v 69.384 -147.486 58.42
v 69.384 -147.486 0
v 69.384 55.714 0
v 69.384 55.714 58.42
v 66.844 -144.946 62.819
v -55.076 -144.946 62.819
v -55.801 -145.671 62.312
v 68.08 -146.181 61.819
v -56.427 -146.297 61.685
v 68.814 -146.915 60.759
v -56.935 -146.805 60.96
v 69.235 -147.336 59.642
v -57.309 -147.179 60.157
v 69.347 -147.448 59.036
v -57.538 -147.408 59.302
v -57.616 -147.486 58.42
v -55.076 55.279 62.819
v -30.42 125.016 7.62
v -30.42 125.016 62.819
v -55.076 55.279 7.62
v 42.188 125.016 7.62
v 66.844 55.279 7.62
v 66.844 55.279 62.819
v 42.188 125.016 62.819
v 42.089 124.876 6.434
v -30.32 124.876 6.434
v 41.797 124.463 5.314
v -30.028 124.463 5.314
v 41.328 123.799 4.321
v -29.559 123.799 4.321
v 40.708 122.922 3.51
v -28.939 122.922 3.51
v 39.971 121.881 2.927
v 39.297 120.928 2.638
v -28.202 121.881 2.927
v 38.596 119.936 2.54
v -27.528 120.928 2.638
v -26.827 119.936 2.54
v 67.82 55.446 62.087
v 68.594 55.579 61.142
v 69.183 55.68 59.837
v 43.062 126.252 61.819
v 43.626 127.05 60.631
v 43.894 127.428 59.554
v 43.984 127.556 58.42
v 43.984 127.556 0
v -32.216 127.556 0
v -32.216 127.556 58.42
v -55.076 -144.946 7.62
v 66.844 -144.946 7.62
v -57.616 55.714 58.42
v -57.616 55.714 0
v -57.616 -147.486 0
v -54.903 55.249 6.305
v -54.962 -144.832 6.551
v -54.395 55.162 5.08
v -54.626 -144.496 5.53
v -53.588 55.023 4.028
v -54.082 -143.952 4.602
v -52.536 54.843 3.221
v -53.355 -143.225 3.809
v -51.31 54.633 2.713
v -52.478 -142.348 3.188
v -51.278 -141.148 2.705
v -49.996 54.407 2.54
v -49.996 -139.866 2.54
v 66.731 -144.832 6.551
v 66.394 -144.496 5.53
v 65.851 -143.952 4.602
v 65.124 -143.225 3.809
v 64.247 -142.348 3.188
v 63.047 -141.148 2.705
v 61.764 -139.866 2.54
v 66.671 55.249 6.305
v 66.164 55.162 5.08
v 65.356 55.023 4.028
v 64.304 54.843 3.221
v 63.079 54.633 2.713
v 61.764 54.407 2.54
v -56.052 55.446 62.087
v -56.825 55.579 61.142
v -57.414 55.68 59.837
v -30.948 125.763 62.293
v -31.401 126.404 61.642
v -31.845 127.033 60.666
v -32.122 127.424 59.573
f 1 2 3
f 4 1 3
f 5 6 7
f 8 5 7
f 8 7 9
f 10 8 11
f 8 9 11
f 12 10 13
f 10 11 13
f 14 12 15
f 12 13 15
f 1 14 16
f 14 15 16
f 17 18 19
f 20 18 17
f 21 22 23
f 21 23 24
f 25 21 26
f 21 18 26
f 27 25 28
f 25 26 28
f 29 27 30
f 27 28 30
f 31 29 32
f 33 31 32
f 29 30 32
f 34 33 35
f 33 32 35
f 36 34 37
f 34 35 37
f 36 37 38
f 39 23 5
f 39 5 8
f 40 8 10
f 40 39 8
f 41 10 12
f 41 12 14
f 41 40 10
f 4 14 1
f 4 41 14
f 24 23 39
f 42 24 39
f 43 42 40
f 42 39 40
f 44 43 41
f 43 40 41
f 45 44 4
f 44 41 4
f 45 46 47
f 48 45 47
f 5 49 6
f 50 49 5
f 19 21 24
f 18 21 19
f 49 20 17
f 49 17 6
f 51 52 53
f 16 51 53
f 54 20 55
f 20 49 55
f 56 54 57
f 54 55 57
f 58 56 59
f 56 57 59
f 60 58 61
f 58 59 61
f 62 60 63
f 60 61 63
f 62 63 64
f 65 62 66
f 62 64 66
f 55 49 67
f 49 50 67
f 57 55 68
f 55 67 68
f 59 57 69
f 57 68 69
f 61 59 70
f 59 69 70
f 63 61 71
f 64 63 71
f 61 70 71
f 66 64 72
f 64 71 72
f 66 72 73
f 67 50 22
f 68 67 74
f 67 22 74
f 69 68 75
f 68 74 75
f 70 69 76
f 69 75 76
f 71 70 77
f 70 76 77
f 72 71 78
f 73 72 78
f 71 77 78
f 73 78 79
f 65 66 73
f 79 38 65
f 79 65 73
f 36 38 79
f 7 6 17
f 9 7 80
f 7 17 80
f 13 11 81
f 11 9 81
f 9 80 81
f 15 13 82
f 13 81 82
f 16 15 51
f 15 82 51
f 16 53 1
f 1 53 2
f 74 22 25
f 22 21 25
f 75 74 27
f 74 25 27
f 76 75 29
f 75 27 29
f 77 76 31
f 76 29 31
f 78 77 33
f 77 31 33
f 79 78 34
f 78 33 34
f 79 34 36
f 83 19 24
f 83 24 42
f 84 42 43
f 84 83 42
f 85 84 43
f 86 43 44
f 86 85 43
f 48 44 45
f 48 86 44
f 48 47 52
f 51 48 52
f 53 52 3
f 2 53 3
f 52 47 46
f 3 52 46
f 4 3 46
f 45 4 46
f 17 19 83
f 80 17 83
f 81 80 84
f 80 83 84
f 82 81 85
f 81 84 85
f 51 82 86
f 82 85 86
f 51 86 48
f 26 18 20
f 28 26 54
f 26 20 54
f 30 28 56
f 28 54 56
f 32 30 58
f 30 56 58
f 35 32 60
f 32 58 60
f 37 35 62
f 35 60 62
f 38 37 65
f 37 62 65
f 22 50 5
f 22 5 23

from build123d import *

# Parameters (mm, degrees)
F1_DEPTH    = 63.5
F2_T        = -2.54
F3_R        = 5.08
F4_T1_DEPTH = 110.49
F4_T3_DEPTH = 101.6
F4_T5_DEPTH = 110.49
F4_T7_DEPTH = 237.49
F4_T9_DEPTH = 152.4


# Not quite as in the source:
# - a fillet or chamfer that OpenCascade refuses, or shapes differently, is made with other operations: its cross-section is extruded or revolved along the edge and cut away or added


with BuildPart() as f1:
    # F0 (on Top) → F1 (new body)
    with BuildSketch(Plane.XY):
        Polygon((-32.2156401169, 127.5564689514), (-57.6156401169, 55.7144199828), (-57.6156401169, -147.4855800172), (69.3843598831, -147.4855800172), (69.3843598831, 55.7144199828), (43.9843598831, 127.5564689514), align=None)
    extrude(amount=F1_DEPTH)

    # F2
    f2_openings = [f1.faces().sort_by_distance(p)[0] for p in [
        (5.88436, -16.224771, 63.5),
    ]]
    offset(amount=F2_T, openings=f2_openings)

    # F3
    f3_edges = [f1.edges().sort_by_distance(p)[0] for p in [
        (54.516334, 90.147547, 2.54),
        (5.88436, 125.016469, 2.54),
        (-42.747615, 90.147547, 2.54),
        (-55.07564, -44.833478, 2.54),
        (5.88436, -144.94558, 2.54),
        (66.84436, -44.833478, 2.54),
    ]]
    fillet(f3_edges, radius=F3_R)

    # F4: fillet of radius 5.08 on 6 edges, made by hand

    # F4_s2 → F4_t1 (cut)
    with BuildSketch(Plane(origin=(40.7409485113, 115.2328038573, 0), x_dir=(0, 0, 1), z_dir=(-0.3333333333, -0.9428090416, 0))):
        with BuildLine():
            ThreePointArc((63.5, 67.8120197664), (62.0121024484, 71.4041222148), (58.42, 72.8920197664))
            Line((58.42, 72.8920197664), (63.5, 72.8920197664))
            Line((63.5, 72.8920197664), (63.5, 67.8120197664))
        make_face()
    extrude(amount=F4_T1_DEPTH, mode=Mode.SUBTRACT)

    # F4_s4 → F4_t3 (cut)
    with BuildSketch(Plane.YZ.offset(-44.9156401169)):
        with BuildLine():
            ThreePointArc((122.4764689514, 63.5), (126.0685713998, 62.0121024484), (127.5564689514, 58.42))
            Line((127.5564689514, 58.42), (127.5564689514, 63.5))
            Line((127.5564689514, 63.5), (122.4764689514, 63.5))
        make_face()
    extrude(amount=F4_T3_DEPTH, mode=Mode.SUBTRACT)

    # F4_s6 → F4_t5 (cut)
    with BuildSketch(Plane(origin=(-2.6033129818, 7.3632810518, 0), x_dir=(0, 0, 1), z_dir=(-0.3333333333, 0.9428090416, 0))):
        with BuildLine():
            ThreePointArc((63.5, 78.9076751698), (62.0121024484, 82.4997776182), (58.42, 83.9876751698))
            Line((58.42, 83.9876751698), (63.5, 83.9876751698))
            Line((63.5, 83.9876751698), (63.5, 78.9076751698))
        make_face()
    extrude(amount=F4_T5_DEPTH, mode=Mode.SUBTRACT)

    # F4_s8 → F4_t7 (cut)
    with BuildSketch(Plane.XZ.offset(-77.3044199828)):
        with BuildLine():
            ThreePointArc((-52.5356401169, 63.5), (-56.1277425653, 62.0121024484), (-57.6156401169, 58.42))
            Line((-57.6156401169, 58.42), (-57.6156401169, 63.5))
            Line((-57.6156401169, 63.5), (-52.5356401169, 63.5))
        make_face()
        with BuildLine():
            ThreePointArc((64.3043598831, 63.5), (67.8964623315, 62.0121024484), (69.3843598831, 58.42))
            Line((69.3843598831, 58.42), (69.3843598831, 63.5))
            Line((69.3843598831, 63.5), (64.3043598831, 63.5))
        make_face()
    extrude(amount=F4_T7_DEPTH, mode=Mode.SUBTRACT)

    # F4_s10 → F4_t9 (cut)
    with BuildSketch(Plane.YZ.offset(-70.3156401169)):
        with BuildLine():
            ThreePointArc((-142.4055800172, 63.5), (-145.9976824656, 62.0121024484), (-147.4855800172, 58.42))
            Line((-147.4855800172, 58.42), (-147.4855800172, 63.5))
            Line((-147.4855800172, 63.5), (-142.4055800172, 63.5))
        make_face()
    extrude(amount=F4_T9_DEPTH, mode=Mode.SUBTRACT)


solid = f1.part
